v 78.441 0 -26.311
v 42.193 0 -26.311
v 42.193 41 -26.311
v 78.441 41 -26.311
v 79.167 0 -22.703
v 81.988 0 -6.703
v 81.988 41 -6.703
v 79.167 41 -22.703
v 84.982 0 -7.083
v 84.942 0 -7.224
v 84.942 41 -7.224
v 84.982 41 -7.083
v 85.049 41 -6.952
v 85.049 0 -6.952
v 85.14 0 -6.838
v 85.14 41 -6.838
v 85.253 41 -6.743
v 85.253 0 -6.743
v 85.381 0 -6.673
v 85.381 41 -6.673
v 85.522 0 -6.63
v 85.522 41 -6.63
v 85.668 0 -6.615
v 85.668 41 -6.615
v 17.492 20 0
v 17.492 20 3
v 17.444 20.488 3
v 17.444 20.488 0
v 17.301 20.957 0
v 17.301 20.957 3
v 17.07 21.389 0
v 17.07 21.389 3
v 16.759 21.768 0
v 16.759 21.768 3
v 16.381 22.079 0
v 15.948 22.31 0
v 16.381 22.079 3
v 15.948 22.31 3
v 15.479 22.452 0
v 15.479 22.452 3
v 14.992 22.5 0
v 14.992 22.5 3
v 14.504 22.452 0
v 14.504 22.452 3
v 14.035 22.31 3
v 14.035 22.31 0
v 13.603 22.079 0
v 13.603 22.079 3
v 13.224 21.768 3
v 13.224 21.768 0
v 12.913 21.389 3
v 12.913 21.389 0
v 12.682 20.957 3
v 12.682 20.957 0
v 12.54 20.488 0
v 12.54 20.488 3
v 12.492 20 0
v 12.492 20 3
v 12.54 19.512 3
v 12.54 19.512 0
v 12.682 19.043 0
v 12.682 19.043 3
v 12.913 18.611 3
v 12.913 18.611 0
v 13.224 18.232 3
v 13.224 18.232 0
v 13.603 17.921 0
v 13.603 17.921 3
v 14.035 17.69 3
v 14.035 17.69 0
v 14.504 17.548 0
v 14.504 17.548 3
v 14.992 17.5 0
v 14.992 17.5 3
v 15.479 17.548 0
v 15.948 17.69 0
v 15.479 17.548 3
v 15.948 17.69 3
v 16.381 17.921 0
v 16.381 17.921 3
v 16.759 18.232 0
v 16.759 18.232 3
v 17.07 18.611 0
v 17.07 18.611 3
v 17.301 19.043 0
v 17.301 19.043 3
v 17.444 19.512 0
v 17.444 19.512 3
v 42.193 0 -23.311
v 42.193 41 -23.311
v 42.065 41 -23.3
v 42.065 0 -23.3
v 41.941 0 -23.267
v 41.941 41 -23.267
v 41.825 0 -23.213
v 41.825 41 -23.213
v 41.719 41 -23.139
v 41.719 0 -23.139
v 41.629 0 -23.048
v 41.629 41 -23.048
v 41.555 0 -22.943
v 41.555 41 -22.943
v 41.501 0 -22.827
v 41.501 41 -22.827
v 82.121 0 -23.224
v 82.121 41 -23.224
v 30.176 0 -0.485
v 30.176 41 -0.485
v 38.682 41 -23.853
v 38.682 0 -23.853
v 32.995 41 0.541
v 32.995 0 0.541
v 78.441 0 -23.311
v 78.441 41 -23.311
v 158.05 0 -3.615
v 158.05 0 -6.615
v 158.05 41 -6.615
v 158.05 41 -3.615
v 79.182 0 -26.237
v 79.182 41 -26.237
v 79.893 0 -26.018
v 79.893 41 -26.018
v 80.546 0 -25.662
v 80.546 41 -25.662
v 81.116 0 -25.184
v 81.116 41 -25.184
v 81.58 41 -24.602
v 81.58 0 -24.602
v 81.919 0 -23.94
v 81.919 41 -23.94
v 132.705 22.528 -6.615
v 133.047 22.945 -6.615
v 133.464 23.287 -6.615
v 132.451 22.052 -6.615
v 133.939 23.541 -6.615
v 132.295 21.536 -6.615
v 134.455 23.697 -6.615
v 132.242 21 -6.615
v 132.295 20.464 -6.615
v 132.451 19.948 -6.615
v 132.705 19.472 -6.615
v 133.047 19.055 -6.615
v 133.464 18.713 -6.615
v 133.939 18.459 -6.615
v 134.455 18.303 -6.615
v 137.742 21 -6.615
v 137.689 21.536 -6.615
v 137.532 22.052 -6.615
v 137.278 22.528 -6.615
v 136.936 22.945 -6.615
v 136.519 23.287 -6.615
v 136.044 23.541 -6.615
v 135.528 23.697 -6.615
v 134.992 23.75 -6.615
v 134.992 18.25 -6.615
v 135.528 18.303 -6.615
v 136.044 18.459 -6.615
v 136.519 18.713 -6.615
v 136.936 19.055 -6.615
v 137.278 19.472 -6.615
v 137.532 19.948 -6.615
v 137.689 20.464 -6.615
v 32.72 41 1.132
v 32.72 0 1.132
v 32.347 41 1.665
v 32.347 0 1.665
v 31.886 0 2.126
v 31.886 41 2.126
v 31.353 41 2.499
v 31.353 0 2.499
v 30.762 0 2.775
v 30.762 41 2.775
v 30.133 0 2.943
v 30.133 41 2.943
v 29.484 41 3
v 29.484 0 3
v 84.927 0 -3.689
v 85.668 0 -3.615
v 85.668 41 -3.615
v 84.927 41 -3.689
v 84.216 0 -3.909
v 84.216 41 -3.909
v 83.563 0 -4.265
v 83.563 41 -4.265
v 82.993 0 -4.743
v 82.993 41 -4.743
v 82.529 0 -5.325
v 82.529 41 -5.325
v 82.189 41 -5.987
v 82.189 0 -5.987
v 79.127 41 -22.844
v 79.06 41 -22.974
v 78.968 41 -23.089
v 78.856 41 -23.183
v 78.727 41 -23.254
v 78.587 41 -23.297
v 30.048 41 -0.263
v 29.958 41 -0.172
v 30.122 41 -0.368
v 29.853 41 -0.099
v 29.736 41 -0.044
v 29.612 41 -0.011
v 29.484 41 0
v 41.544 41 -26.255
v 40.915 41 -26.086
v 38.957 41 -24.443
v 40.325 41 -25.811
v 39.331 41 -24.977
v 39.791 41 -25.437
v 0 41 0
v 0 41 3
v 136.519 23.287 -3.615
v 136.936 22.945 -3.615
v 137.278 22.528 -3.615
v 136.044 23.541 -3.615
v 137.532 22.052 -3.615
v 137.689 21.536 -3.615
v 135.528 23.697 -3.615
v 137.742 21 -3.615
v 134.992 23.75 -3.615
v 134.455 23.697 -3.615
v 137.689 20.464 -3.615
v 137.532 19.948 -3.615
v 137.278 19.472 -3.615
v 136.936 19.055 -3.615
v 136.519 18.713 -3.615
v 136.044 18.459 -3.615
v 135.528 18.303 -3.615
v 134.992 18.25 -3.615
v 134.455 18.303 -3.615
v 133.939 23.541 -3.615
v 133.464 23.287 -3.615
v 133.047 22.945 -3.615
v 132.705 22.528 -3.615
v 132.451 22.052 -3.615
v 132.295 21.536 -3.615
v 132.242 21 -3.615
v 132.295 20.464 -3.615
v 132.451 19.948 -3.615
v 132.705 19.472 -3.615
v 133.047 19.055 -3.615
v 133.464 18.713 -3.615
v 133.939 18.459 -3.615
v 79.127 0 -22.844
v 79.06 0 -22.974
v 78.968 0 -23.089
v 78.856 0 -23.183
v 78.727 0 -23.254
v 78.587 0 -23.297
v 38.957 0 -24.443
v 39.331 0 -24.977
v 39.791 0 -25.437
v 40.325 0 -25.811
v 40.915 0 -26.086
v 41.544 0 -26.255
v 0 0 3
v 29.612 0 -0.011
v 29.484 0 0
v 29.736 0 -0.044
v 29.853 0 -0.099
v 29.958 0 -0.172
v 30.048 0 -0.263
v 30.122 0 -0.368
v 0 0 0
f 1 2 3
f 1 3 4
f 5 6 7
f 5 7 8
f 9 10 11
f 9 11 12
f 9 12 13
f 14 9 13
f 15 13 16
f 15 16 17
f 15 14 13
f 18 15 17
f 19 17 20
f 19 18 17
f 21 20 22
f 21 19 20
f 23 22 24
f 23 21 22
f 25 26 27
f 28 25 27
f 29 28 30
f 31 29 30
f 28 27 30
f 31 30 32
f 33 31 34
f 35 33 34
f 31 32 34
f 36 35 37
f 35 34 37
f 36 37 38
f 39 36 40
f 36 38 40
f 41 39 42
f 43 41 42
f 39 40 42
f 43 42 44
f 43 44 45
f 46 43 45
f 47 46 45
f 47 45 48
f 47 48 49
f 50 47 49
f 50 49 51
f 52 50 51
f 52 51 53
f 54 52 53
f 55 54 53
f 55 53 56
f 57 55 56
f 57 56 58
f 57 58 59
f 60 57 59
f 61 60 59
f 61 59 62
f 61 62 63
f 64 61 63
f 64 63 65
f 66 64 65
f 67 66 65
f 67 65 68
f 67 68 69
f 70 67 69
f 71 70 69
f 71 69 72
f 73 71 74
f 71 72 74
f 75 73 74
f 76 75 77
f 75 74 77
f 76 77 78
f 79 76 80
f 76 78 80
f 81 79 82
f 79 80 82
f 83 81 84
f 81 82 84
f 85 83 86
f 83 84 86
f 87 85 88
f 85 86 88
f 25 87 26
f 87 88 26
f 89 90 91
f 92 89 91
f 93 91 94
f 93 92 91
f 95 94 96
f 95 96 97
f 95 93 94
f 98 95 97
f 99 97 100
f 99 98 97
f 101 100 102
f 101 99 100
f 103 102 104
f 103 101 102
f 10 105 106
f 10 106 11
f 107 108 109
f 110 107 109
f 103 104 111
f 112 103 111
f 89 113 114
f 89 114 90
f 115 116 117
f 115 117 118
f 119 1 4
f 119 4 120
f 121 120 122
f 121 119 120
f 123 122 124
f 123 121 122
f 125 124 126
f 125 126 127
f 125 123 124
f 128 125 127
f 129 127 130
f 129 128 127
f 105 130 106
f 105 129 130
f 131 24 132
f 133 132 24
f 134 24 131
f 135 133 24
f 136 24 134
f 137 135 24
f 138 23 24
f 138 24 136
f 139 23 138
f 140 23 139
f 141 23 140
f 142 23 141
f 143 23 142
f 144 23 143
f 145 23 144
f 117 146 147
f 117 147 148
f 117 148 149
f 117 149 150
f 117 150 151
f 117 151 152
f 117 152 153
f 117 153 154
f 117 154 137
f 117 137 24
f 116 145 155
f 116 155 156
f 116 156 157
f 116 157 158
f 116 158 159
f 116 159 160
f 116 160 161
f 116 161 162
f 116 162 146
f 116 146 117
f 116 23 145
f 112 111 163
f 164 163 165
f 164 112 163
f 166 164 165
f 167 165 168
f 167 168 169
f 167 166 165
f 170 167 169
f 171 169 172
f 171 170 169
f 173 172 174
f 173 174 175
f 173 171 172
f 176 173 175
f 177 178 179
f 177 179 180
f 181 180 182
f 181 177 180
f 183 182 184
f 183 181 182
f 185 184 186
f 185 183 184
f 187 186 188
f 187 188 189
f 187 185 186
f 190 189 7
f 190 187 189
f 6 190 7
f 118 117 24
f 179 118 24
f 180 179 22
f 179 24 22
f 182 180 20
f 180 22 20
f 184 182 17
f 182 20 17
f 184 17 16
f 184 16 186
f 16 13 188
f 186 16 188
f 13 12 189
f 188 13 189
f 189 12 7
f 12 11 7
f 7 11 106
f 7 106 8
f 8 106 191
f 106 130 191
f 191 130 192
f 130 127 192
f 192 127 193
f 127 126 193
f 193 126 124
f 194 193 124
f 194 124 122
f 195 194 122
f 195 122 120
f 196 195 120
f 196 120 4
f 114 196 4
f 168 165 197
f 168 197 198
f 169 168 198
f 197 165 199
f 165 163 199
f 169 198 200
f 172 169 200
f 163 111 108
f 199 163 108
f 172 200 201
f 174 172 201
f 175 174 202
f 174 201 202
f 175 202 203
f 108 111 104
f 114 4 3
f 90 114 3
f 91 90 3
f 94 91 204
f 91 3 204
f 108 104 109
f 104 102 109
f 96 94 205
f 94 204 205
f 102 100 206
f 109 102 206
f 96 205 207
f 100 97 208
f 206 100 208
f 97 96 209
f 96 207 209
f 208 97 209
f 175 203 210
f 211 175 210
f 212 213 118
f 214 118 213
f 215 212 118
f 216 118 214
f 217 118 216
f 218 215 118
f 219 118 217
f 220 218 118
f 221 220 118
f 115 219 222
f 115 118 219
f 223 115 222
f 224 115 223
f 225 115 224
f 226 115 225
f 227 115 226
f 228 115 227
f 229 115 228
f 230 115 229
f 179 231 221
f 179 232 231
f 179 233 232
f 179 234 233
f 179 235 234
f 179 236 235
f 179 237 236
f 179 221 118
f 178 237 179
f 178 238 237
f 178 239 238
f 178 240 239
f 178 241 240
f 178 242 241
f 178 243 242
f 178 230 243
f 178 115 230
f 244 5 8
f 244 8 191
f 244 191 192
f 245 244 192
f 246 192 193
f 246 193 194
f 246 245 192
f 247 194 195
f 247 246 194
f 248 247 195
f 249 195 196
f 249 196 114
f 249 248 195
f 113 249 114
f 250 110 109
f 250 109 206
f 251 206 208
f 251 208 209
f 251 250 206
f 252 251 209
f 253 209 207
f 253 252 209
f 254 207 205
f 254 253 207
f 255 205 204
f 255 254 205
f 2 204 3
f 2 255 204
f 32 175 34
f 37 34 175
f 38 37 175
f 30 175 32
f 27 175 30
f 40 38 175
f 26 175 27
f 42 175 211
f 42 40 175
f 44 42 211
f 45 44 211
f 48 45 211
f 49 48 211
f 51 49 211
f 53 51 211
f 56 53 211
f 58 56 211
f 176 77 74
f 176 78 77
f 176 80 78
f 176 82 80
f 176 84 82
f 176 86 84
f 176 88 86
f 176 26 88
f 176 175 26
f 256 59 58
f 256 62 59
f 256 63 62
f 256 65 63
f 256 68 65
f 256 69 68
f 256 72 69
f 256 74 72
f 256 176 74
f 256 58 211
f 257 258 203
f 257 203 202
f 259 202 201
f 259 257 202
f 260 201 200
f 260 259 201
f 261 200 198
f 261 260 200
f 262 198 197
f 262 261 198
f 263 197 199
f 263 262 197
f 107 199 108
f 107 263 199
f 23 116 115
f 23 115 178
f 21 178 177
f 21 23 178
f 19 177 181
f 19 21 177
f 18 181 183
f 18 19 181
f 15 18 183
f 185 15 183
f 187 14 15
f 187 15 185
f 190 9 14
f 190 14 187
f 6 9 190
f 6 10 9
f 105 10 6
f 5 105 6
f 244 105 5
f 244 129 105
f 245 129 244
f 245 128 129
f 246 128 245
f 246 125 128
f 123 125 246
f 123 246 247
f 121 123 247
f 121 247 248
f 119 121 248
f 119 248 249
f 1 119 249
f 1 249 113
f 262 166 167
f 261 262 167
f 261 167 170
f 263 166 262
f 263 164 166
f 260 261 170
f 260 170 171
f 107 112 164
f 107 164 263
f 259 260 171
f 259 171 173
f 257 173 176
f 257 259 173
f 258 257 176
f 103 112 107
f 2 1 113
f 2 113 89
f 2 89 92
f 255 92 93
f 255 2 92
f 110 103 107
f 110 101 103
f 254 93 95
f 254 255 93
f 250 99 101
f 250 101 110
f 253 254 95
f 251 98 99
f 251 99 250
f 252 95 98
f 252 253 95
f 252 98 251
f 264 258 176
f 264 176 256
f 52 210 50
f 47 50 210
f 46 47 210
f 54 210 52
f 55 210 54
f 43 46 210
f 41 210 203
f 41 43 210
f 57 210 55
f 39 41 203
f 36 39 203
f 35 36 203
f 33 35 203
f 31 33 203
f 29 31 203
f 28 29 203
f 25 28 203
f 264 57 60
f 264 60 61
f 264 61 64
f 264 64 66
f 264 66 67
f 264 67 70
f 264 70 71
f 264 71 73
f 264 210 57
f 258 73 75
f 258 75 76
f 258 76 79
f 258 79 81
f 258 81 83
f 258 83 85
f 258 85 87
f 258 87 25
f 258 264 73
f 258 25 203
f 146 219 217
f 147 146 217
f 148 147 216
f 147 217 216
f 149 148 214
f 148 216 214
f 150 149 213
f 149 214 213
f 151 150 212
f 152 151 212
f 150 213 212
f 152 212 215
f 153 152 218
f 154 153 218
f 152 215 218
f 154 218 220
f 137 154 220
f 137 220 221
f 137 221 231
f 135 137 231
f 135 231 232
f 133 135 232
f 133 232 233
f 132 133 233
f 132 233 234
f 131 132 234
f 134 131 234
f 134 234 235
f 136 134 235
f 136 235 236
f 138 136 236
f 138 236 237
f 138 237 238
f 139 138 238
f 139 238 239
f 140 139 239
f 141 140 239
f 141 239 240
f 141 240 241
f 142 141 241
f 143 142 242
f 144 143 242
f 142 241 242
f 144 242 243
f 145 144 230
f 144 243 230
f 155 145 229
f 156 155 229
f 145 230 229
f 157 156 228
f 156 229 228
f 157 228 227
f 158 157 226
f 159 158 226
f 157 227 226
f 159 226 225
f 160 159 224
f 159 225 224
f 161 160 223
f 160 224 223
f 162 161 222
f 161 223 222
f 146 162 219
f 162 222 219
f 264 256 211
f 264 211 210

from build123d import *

# Parameters (mm, degrees)
BASE_FLANGE1_DEPTH = 41
SKETCH2_R          = 2.5
CUT_EXTRUDE1_DEPTH = 10
SKETCH3_R          = 2.75
SKETCH3_R_2        = 2.5
CUT_EXTRUDE2_DEPTH = 10


# Sheet-metal steps are written as plain solids
with BuildPart() as part:
    # Sketch1 → Base-Flange1 (new body)
    with BuildSketch(Plane(origin=(0, 0, 0), x_dir=(1, 0, 0), z_dir=(0, 1, 0))):
        with BuildLine():
            Line((0, 0), (29.484227127, 0))
            ThreePointArc((29.484227127, 0), (29.90672353, 0.133212604), (30.176404712, 0.484667962))
            Line((30.176404712, 0.484667962), (38.681704054, 23.85278585))
            ThreePointArc((38.681704054, 23.85278585), (40.049733788, 25.635636911), (42.1929595, 26.311393382))
            Line((42.1929595, 26.311393382), (78.441184331, 26.311393382))
            ThreePointArc((78.441184331, 26.311393382), (80.843024514, 25.437195048), (82.121016981, 23.223647163))
            Line((82.121016981, 23.223647163), (84.942198964, 7.223929074))
            ThreePointArc((84.942198964, 7.223929074), (85.194131001, 6.787569985), (85.667608355, 6.615238322))
            Line((85.667608355, 6.615238322), (158.049527566, 6.615238322))
            Line((158.049527566, 6.615238322), (158.049527566, 3.615238322))
            Line((158.049527566, 3.615238322), (85.667608355, 3.615238322))
            ThreePointArc((85.667608355, 3.615238322), (83.265768172, 4.489436656), (81.987775705, 6.702984541))
            Line((81.987775705, 6.702984541), (79.166593722, 22.70270263))
            ThreePointArc((79.166593722, 22.70270263), (78.914661685, 23.139061719), (78.441184331, 23.311393382))
            Line((78.441184331, 23.311393382), (42.1929595, 23.311393382))
            ThreePointArc((42.1929595, 23.311393382), (41.770463097, 23.178180778), (41.500781916, 22.82672542))
            Line((41.500781916, 22.82672542), (32.995482574, -0.541392468))
            ThreePointArc((32.995482574, -0.541392468), (31.627452839, -2.324243529), (29.484227127, -3))
            Line((29.484227127, -3), (0, -3))
            Line((0, -3), (0, 0))
        make_face()
    extrude(amount=BASE_FLANGE1_DEPTH)

    # Sketch2 → Cut-Extrude1 (cut)
    with BuildSketch(Plane.XY.offset(3)):
        with Locations((14.991664351, 20)):
            Circle(SKETCH2_R)
    extrude(amount=-CUT_EXTRUDE1_DEPTH, mode=Mode.SUBTRACT)

    # Sketch3 → Cut-Extrude2 (cut)
    with BuildSketch(Plane.XY.offset(-3.615238322)):
        with Locations((134.991664351, 21)):
            Circle(SKETCH3_R)
        with Locations((14.991664351, 20)):
            Circle(SKETCH3_R_2)
    extrude(amount=-CUT_EXTRUDE2_DEPTH, mode=Mode.SUBTRACT)


solid = part.part
